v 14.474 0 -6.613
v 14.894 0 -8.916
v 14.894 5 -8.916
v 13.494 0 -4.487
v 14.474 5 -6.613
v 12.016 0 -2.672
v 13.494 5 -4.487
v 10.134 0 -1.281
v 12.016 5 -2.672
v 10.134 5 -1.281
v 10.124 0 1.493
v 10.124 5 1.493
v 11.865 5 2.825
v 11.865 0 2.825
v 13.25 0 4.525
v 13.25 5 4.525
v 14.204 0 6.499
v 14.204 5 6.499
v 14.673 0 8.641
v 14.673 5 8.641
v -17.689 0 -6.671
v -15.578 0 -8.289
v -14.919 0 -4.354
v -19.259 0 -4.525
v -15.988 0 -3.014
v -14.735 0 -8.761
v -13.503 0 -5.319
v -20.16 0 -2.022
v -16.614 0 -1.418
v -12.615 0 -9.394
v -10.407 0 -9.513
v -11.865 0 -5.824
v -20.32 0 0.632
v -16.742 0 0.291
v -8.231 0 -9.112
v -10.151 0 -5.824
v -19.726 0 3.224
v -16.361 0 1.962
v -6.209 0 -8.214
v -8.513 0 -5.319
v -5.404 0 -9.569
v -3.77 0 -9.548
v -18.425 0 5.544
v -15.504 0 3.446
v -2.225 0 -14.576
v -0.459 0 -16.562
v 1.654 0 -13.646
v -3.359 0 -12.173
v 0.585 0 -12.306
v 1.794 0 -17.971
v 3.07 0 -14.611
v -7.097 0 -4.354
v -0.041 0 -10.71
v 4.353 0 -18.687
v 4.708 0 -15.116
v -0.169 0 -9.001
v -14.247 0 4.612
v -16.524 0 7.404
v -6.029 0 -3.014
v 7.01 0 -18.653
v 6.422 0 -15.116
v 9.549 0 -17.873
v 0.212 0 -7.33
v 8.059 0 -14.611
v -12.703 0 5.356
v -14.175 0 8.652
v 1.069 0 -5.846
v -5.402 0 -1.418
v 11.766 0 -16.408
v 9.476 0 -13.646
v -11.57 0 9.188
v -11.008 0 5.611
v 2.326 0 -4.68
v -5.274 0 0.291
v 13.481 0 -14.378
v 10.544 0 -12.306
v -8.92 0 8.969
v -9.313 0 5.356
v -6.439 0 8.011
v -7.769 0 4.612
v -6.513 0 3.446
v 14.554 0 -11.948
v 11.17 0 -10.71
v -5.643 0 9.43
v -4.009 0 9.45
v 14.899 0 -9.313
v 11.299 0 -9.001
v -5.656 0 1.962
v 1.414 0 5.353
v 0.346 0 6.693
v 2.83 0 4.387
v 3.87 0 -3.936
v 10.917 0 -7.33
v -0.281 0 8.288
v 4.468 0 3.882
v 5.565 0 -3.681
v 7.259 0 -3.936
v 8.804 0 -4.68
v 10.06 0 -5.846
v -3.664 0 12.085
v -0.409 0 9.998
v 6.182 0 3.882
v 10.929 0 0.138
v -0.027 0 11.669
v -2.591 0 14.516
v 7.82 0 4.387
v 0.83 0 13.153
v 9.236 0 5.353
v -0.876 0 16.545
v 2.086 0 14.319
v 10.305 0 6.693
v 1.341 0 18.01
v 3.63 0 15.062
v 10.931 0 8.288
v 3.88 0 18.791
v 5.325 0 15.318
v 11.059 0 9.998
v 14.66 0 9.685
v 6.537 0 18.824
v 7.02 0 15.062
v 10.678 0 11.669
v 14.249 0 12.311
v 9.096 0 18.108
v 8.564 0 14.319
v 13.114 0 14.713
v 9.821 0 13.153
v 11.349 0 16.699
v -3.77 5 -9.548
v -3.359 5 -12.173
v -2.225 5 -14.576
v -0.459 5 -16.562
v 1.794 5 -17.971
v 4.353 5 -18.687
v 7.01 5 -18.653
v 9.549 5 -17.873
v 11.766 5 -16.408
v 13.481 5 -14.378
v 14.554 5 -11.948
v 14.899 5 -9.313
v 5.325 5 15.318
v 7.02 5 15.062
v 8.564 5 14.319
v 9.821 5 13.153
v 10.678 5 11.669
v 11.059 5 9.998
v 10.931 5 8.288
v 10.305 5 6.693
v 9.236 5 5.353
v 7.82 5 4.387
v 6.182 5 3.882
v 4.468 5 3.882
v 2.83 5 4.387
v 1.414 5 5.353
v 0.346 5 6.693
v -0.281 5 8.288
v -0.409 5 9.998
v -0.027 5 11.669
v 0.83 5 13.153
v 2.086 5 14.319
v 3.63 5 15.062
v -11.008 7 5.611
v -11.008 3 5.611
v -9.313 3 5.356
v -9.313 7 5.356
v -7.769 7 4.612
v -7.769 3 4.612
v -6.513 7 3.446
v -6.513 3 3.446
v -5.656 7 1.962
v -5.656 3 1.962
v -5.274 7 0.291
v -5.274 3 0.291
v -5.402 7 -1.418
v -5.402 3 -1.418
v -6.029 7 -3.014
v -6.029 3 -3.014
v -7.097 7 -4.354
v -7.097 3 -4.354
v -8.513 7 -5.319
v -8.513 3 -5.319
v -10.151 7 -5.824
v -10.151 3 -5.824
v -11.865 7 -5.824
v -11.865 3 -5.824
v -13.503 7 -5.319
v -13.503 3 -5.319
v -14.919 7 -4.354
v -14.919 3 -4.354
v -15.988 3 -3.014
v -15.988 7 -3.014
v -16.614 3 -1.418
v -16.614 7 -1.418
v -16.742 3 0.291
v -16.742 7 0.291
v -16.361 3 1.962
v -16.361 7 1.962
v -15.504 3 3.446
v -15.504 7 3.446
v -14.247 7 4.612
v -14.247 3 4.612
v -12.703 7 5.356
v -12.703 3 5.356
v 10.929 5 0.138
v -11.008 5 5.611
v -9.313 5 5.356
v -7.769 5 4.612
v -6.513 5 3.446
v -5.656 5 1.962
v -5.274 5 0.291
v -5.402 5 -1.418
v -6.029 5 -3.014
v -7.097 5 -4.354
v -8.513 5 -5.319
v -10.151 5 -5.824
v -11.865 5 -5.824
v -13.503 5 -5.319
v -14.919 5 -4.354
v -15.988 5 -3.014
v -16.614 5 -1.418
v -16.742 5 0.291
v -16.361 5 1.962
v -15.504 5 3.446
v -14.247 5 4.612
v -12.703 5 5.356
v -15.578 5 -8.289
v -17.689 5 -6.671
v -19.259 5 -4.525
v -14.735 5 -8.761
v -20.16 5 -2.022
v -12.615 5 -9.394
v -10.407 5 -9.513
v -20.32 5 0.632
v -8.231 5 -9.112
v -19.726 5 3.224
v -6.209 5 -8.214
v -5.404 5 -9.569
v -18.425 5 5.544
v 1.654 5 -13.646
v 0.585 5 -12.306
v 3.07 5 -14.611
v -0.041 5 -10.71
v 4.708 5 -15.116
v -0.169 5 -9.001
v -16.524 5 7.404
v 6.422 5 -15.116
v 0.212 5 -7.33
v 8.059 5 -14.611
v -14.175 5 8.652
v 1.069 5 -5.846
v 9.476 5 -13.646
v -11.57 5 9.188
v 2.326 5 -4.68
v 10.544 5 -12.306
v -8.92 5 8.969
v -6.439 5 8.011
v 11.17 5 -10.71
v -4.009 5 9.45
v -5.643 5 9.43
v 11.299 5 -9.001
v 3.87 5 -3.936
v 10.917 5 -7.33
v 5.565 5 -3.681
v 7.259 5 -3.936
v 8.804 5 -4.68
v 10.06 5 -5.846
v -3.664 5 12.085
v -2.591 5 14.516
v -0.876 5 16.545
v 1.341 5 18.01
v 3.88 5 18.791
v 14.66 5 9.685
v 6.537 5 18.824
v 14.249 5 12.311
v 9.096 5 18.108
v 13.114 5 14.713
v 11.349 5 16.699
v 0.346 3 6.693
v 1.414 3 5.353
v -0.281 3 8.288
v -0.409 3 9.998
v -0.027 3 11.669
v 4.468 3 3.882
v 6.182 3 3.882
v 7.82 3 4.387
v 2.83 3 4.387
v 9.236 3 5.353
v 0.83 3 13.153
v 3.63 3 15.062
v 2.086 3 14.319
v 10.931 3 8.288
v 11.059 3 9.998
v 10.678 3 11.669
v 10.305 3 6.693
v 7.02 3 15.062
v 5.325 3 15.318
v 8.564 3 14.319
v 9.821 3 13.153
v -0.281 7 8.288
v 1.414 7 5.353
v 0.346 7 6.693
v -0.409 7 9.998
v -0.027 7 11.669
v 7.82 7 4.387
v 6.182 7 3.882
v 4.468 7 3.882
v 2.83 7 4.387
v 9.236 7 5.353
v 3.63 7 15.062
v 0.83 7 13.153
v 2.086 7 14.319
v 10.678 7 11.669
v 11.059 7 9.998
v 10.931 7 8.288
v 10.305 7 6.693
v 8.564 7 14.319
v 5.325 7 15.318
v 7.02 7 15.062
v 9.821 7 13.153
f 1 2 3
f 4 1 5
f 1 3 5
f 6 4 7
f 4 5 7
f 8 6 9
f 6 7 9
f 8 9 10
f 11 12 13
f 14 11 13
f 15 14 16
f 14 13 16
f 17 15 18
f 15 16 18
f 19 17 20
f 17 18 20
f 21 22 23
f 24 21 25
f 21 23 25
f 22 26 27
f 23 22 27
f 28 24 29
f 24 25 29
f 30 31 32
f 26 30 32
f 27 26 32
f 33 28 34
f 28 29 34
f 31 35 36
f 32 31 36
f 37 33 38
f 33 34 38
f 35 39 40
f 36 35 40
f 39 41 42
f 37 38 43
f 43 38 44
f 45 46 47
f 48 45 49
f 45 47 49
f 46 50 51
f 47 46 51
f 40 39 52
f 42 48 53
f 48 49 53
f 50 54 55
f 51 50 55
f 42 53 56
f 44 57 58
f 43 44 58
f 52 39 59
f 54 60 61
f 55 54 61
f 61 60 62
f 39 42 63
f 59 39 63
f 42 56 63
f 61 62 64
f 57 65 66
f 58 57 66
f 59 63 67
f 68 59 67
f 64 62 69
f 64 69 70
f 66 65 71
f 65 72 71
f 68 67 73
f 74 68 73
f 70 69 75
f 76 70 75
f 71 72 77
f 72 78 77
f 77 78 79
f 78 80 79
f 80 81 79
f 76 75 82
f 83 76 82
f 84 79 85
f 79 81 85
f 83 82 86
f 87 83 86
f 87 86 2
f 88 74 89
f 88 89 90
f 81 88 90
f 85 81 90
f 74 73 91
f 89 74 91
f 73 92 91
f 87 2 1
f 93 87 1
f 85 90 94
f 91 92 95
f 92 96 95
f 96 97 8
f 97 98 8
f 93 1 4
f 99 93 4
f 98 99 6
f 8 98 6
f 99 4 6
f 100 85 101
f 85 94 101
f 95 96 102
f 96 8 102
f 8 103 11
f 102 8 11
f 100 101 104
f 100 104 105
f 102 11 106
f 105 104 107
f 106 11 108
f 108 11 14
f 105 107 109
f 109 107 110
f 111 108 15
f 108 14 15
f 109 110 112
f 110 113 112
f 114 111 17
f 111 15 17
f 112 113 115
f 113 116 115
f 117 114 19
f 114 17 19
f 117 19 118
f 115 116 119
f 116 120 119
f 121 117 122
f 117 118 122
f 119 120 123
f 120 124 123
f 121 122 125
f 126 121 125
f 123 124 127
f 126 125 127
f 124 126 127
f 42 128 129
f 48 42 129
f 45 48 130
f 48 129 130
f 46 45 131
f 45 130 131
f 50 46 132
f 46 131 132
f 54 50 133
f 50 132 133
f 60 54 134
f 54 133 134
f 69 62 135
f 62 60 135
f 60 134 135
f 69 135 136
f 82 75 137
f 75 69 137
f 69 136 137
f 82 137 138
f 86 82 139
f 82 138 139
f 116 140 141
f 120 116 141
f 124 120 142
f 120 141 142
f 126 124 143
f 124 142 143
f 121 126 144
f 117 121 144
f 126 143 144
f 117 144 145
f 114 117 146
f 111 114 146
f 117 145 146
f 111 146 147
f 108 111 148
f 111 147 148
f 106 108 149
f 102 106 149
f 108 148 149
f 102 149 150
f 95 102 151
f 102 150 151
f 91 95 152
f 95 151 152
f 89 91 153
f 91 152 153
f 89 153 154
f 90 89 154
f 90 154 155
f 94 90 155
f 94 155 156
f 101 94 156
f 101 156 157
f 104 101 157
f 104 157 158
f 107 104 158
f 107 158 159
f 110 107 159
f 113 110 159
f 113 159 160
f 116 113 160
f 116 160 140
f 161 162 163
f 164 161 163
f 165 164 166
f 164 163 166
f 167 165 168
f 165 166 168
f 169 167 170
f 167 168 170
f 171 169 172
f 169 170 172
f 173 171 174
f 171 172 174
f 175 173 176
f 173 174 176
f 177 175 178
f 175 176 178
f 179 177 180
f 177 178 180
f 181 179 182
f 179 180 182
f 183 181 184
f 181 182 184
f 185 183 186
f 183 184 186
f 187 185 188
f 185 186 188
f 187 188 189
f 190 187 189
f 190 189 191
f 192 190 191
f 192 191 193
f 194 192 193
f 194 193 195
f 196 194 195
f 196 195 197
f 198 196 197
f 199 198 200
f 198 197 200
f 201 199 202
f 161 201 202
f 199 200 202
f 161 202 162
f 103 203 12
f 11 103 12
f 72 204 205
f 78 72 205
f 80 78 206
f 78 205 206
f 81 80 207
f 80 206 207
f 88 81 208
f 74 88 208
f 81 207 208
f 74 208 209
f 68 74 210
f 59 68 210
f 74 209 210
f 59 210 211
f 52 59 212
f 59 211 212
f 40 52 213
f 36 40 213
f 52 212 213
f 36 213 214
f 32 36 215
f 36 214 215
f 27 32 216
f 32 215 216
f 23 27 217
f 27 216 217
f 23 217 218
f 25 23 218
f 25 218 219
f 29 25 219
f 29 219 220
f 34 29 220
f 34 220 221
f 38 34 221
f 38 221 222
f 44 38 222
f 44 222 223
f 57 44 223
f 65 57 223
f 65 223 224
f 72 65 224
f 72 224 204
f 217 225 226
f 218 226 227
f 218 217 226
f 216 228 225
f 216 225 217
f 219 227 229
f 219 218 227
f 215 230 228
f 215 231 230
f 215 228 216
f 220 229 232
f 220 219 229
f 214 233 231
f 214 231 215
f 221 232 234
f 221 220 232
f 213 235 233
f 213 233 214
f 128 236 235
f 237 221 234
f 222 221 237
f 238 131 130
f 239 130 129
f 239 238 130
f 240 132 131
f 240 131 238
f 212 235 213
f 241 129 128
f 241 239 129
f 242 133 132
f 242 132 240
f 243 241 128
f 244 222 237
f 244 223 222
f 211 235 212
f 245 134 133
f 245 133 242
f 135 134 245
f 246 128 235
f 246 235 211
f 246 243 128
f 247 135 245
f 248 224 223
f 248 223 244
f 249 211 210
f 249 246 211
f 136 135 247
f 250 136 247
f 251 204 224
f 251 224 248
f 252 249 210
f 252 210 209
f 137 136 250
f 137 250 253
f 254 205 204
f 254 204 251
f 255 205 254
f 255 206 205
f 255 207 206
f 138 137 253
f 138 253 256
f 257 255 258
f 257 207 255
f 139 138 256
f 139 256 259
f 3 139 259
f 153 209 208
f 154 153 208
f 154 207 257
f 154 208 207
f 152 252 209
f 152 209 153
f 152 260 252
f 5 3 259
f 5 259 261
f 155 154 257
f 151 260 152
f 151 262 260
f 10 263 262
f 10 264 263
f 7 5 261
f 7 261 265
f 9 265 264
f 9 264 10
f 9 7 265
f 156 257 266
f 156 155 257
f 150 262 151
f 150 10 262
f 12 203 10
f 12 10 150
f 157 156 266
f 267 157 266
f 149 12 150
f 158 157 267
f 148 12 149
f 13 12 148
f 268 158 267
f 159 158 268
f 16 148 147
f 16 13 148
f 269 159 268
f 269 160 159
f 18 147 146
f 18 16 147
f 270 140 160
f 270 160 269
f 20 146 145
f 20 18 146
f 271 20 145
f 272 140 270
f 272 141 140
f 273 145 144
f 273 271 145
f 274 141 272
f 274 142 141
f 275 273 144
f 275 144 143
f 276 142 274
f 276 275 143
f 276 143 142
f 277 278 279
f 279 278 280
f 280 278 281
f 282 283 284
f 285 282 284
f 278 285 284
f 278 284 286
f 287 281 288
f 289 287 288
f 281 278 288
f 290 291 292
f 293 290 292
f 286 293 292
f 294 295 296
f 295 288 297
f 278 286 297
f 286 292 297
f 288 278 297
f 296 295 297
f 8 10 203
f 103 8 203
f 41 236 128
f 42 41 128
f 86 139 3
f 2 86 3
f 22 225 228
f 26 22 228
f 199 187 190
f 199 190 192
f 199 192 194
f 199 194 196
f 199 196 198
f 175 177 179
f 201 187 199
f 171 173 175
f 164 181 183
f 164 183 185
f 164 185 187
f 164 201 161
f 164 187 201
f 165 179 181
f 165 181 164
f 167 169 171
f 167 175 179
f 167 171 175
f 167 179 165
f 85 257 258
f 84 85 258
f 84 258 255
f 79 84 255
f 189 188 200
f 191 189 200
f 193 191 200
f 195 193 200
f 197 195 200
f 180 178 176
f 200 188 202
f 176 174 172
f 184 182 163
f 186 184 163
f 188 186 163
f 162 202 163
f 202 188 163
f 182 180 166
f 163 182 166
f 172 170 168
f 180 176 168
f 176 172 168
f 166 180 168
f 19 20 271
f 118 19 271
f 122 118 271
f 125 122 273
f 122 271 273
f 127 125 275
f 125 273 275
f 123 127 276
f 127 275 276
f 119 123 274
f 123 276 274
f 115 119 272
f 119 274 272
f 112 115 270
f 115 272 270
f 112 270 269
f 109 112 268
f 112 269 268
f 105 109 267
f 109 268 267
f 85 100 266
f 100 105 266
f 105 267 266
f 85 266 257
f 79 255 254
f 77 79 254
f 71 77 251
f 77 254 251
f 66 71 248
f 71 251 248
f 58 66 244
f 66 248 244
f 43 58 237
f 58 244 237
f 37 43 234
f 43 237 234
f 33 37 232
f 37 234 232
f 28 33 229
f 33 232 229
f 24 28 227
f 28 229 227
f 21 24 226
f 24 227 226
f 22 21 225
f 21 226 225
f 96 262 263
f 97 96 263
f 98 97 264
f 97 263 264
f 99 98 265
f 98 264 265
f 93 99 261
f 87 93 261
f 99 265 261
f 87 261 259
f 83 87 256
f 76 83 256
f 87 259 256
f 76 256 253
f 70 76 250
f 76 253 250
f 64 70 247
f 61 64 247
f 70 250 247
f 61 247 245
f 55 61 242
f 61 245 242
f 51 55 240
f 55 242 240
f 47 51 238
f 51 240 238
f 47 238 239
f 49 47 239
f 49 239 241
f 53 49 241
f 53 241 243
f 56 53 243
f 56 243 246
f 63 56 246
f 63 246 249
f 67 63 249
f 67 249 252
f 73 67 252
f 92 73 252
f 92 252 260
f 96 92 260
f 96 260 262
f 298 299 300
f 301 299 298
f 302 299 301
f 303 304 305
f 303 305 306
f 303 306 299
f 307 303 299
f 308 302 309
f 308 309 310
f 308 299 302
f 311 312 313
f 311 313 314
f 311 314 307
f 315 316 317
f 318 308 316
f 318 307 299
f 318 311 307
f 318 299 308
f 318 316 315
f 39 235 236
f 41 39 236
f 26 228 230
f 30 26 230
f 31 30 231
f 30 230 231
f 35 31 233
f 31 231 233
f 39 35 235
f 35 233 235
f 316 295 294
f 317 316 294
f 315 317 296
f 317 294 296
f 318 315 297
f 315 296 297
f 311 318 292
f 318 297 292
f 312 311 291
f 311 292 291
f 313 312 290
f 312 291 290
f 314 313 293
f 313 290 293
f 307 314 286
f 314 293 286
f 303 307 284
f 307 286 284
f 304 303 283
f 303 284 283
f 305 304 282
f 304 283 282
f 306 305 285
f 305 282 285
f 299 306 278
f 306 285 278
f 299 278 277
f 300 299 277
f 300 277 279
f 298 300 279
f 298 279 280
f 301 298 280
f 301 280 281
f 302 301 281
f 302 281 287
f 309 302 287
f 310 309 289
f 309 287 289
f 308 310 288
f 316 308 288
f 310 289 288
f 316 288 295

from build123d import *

# Parameters (mm, degrees)
SKETCH5_R                  = 30
BOSS_EXTRUDE1_DEPTH        = 5
SKETCH6_R                  = 5.75
CUT_EXTRUDE1_DEPTH         = 50
CUT_EXTRUDE_THIN1_DEPTH    = 50
BOSS_EXTRUDE2_DEPTH        = 2
BOSS_EXTRUDE2_DEPTH_BACK   = 2
SKETCH10_R                 = 5.75
BOSS_EXTRUDE2_2_DEPTH      = 2
BOSS_EXTRUDE2_2_DEPTH_BACK = 2


with BuildPart() as part:
    # Sketch5 → Boss-Extrude1 (new body)
    with BuildSketch(Plane(origin=(0, 0, 0), x_dir=(1, 0, 0), z_dir=(0, 1, 0))):
        with Locations(Location((0, 0, 0), (0, 0, 270))):
            Circle(SKETCH5_R)
    extrude(amount=BOSS_EXTRUDE1_DEPTH)

    # Sketch6 → Cut-Extrude1 (cut)
    with BuildSketch(Plane(origin=(0, 5, 0), x_dir=(1, 0, 0), z_dir=(0, 1, 0))):
        with Locations(Location((5.564652455, 9.430649132, 0), (0, 0, 270))):
            Circle(SKETCH6_R)
        with Locations(Location((5.325305202, -9.567843252, 0), (0, 0, 270))):
            Circle(SKETCH6_R)
        with Locations(Location((-11.00819821, 0.138683741, 0), (0, 0, 270))):
            Circle(SKETCH6_R)
    extrude(amount=-CUT_EXTRUDE1_DEPTH, mode=Mode.SUBTRACT)

    # Sketch9 → Cut-Extrude-Thin1 (cut)
    with BuildSketch(Plane(origin=(0, 5, 0), x_dir=(1, 0, 0), z_dir=(0, 1, 0))):
        with BuildLine():
            ThreePointArc((-3.76991423, 9.548248089), (5.682251411, 18.765215817), (14.899219139, 9.313050176))
            Line((14.899219139, 9.313050176), (14.659871887, -9.685442209))
            ThreePointArc((14.659871887, -9.685442209), (5.207706246, -18.902409937), (-4.009261482, -9.450244295))
            Line((-4.009261482, -9.450244295), (-14.008468, -9.324272058))
            ThreePointArc((-14.008468, -9.324272058), (5.081734008, -28.901616455), (24.659078405, -9.811414447))
            Line((24.659078405, -9.811414447), (24.898425657, 9.187077938))
            ThreePointArc((24.898425657, 9.187077938), (5.808223649, 28.764422335), (-13.769120748, 9.674220327))
            Line((-13.769120748, 9.674220327), (-3.76991423, 9.548248089))
        make_face()
        with BuildLine():
            ThreePointArc((10.124185438, -1.49260411), (13.400544345, -14.366723488), (0.526424967, -17.643082394))
            Line((0.526424967, -17.643082394), (-15.807078446, -7.936555401))
            ThreePointArc((-15.807078446, -7.936555401), (-19.083437352, 4.937563977), (-6.209317974, 8.213922883))
            Line((-6.209317974, 8.213922883), (-1.100619557, 16.810503626))
            ThreePointArc((-1.100619557, 16.810503626), (-27.680018096, 10.046262394), (-20.915776863, -16.533136145))
            Line((-20.915776863, -16.533136145), (-4.582273451, -26.239663138))
            ThreePointArc((-4.582273451, -26.239663138), (21.997125088, -19.475421905), (15.232883856, 7.103976633))
            Line((15.232883856, 7.103976633), (10.124185438, -1.49260411))
        make_face()
        with BuildLine():
            ThreePointArc((-6.438623457, -8.011462842), (-19.158344793, -4.430891012), (-15.577772963, 8.288830324))
            Line((-15.577772963, 8.288830324), (0.995077701, 17.580795716))
            ThreePointArc((0.995077701, 17.580795716), (13.714799038, 14.000223886), (10.134227208, 1.280502549))
            Line((10.134227208, 1.280502549), (15.024735309, -7.442050432))
            ThreePointArc((15.024735309, -7.442050432), (22.437352019, 18.890731987), (-3.8954304, 26.303348697))
            Line((-3.8954304, 26.303348697), (-20.468281064, 17.011383305))
            ThreePointArc((-20.468281064, 17.011383305), (-27.880897775, -9.321399113), (-1.548115356, -16.734015824))
            Line((-1.548115356, -16.734015824), (-6.438623457, -8.011462842))
        make_face()
    extrude(amount=-CUT_EXTRUDE_THIN1_DEPTH, mode=Mode.SUBTRACT)


with BuildPart() as cut_extrude_thin1_kept_piece:
    # of the separate pieces the step leaves, the one the design keeps (cut_extrude_thin1_pieces_kept)
    add(part.part.solids().sort_by_distance((-4.009261482, 0, 9.450244295))[0])


with BuildPart() as body_2:
    # Sketch10 → Boss-Extrude2 (new, two sides: drawn at the far end of the back side and taken through both)
    with BuildSketch(Plane(origin=(0, 5, 0), x_dir=(1, 0, 0), z_dir=(0, 1, 0)).offset(-BOSS_EXTRUDE2_DEPTH_BACK)):
        with Locations(Location((5.325305202, -9.567843252, 0), (0, 0, 270))):
            Circle(SKETCH10_R)
    extrude(amount=BOSS_EXTRUDE2_DEPTH + BOSS_EXTRUDE2_DEPTH_BACK)


with BuildPart() as body_3:
    # Sketch10 → Boss-Extrude2 2 (new, two sides: drawn at the far end of the back side and taken through both)
    with BuildSketch(Plane(origin=(0, 5, 0), x_dir=(1, 0, 0), z_dir=(0, 1, 0)).offset(-BOSS_EXTRUDE2_2_DEPTH_BACK)):
        with Locations(Location((-11.00819821, 0.138683741, 0), (0, 0, 270))):
            Circle(SKETCH10_R)
    extrude(amount=BOSS_EXTRUDE2_2_DEPTH + BOSS_EXTRUDE2_2_DEPTH_BACK)


solid = Compound([cut_extrude_thin1_kept_piece.part, body_2.part, body_3.part])
